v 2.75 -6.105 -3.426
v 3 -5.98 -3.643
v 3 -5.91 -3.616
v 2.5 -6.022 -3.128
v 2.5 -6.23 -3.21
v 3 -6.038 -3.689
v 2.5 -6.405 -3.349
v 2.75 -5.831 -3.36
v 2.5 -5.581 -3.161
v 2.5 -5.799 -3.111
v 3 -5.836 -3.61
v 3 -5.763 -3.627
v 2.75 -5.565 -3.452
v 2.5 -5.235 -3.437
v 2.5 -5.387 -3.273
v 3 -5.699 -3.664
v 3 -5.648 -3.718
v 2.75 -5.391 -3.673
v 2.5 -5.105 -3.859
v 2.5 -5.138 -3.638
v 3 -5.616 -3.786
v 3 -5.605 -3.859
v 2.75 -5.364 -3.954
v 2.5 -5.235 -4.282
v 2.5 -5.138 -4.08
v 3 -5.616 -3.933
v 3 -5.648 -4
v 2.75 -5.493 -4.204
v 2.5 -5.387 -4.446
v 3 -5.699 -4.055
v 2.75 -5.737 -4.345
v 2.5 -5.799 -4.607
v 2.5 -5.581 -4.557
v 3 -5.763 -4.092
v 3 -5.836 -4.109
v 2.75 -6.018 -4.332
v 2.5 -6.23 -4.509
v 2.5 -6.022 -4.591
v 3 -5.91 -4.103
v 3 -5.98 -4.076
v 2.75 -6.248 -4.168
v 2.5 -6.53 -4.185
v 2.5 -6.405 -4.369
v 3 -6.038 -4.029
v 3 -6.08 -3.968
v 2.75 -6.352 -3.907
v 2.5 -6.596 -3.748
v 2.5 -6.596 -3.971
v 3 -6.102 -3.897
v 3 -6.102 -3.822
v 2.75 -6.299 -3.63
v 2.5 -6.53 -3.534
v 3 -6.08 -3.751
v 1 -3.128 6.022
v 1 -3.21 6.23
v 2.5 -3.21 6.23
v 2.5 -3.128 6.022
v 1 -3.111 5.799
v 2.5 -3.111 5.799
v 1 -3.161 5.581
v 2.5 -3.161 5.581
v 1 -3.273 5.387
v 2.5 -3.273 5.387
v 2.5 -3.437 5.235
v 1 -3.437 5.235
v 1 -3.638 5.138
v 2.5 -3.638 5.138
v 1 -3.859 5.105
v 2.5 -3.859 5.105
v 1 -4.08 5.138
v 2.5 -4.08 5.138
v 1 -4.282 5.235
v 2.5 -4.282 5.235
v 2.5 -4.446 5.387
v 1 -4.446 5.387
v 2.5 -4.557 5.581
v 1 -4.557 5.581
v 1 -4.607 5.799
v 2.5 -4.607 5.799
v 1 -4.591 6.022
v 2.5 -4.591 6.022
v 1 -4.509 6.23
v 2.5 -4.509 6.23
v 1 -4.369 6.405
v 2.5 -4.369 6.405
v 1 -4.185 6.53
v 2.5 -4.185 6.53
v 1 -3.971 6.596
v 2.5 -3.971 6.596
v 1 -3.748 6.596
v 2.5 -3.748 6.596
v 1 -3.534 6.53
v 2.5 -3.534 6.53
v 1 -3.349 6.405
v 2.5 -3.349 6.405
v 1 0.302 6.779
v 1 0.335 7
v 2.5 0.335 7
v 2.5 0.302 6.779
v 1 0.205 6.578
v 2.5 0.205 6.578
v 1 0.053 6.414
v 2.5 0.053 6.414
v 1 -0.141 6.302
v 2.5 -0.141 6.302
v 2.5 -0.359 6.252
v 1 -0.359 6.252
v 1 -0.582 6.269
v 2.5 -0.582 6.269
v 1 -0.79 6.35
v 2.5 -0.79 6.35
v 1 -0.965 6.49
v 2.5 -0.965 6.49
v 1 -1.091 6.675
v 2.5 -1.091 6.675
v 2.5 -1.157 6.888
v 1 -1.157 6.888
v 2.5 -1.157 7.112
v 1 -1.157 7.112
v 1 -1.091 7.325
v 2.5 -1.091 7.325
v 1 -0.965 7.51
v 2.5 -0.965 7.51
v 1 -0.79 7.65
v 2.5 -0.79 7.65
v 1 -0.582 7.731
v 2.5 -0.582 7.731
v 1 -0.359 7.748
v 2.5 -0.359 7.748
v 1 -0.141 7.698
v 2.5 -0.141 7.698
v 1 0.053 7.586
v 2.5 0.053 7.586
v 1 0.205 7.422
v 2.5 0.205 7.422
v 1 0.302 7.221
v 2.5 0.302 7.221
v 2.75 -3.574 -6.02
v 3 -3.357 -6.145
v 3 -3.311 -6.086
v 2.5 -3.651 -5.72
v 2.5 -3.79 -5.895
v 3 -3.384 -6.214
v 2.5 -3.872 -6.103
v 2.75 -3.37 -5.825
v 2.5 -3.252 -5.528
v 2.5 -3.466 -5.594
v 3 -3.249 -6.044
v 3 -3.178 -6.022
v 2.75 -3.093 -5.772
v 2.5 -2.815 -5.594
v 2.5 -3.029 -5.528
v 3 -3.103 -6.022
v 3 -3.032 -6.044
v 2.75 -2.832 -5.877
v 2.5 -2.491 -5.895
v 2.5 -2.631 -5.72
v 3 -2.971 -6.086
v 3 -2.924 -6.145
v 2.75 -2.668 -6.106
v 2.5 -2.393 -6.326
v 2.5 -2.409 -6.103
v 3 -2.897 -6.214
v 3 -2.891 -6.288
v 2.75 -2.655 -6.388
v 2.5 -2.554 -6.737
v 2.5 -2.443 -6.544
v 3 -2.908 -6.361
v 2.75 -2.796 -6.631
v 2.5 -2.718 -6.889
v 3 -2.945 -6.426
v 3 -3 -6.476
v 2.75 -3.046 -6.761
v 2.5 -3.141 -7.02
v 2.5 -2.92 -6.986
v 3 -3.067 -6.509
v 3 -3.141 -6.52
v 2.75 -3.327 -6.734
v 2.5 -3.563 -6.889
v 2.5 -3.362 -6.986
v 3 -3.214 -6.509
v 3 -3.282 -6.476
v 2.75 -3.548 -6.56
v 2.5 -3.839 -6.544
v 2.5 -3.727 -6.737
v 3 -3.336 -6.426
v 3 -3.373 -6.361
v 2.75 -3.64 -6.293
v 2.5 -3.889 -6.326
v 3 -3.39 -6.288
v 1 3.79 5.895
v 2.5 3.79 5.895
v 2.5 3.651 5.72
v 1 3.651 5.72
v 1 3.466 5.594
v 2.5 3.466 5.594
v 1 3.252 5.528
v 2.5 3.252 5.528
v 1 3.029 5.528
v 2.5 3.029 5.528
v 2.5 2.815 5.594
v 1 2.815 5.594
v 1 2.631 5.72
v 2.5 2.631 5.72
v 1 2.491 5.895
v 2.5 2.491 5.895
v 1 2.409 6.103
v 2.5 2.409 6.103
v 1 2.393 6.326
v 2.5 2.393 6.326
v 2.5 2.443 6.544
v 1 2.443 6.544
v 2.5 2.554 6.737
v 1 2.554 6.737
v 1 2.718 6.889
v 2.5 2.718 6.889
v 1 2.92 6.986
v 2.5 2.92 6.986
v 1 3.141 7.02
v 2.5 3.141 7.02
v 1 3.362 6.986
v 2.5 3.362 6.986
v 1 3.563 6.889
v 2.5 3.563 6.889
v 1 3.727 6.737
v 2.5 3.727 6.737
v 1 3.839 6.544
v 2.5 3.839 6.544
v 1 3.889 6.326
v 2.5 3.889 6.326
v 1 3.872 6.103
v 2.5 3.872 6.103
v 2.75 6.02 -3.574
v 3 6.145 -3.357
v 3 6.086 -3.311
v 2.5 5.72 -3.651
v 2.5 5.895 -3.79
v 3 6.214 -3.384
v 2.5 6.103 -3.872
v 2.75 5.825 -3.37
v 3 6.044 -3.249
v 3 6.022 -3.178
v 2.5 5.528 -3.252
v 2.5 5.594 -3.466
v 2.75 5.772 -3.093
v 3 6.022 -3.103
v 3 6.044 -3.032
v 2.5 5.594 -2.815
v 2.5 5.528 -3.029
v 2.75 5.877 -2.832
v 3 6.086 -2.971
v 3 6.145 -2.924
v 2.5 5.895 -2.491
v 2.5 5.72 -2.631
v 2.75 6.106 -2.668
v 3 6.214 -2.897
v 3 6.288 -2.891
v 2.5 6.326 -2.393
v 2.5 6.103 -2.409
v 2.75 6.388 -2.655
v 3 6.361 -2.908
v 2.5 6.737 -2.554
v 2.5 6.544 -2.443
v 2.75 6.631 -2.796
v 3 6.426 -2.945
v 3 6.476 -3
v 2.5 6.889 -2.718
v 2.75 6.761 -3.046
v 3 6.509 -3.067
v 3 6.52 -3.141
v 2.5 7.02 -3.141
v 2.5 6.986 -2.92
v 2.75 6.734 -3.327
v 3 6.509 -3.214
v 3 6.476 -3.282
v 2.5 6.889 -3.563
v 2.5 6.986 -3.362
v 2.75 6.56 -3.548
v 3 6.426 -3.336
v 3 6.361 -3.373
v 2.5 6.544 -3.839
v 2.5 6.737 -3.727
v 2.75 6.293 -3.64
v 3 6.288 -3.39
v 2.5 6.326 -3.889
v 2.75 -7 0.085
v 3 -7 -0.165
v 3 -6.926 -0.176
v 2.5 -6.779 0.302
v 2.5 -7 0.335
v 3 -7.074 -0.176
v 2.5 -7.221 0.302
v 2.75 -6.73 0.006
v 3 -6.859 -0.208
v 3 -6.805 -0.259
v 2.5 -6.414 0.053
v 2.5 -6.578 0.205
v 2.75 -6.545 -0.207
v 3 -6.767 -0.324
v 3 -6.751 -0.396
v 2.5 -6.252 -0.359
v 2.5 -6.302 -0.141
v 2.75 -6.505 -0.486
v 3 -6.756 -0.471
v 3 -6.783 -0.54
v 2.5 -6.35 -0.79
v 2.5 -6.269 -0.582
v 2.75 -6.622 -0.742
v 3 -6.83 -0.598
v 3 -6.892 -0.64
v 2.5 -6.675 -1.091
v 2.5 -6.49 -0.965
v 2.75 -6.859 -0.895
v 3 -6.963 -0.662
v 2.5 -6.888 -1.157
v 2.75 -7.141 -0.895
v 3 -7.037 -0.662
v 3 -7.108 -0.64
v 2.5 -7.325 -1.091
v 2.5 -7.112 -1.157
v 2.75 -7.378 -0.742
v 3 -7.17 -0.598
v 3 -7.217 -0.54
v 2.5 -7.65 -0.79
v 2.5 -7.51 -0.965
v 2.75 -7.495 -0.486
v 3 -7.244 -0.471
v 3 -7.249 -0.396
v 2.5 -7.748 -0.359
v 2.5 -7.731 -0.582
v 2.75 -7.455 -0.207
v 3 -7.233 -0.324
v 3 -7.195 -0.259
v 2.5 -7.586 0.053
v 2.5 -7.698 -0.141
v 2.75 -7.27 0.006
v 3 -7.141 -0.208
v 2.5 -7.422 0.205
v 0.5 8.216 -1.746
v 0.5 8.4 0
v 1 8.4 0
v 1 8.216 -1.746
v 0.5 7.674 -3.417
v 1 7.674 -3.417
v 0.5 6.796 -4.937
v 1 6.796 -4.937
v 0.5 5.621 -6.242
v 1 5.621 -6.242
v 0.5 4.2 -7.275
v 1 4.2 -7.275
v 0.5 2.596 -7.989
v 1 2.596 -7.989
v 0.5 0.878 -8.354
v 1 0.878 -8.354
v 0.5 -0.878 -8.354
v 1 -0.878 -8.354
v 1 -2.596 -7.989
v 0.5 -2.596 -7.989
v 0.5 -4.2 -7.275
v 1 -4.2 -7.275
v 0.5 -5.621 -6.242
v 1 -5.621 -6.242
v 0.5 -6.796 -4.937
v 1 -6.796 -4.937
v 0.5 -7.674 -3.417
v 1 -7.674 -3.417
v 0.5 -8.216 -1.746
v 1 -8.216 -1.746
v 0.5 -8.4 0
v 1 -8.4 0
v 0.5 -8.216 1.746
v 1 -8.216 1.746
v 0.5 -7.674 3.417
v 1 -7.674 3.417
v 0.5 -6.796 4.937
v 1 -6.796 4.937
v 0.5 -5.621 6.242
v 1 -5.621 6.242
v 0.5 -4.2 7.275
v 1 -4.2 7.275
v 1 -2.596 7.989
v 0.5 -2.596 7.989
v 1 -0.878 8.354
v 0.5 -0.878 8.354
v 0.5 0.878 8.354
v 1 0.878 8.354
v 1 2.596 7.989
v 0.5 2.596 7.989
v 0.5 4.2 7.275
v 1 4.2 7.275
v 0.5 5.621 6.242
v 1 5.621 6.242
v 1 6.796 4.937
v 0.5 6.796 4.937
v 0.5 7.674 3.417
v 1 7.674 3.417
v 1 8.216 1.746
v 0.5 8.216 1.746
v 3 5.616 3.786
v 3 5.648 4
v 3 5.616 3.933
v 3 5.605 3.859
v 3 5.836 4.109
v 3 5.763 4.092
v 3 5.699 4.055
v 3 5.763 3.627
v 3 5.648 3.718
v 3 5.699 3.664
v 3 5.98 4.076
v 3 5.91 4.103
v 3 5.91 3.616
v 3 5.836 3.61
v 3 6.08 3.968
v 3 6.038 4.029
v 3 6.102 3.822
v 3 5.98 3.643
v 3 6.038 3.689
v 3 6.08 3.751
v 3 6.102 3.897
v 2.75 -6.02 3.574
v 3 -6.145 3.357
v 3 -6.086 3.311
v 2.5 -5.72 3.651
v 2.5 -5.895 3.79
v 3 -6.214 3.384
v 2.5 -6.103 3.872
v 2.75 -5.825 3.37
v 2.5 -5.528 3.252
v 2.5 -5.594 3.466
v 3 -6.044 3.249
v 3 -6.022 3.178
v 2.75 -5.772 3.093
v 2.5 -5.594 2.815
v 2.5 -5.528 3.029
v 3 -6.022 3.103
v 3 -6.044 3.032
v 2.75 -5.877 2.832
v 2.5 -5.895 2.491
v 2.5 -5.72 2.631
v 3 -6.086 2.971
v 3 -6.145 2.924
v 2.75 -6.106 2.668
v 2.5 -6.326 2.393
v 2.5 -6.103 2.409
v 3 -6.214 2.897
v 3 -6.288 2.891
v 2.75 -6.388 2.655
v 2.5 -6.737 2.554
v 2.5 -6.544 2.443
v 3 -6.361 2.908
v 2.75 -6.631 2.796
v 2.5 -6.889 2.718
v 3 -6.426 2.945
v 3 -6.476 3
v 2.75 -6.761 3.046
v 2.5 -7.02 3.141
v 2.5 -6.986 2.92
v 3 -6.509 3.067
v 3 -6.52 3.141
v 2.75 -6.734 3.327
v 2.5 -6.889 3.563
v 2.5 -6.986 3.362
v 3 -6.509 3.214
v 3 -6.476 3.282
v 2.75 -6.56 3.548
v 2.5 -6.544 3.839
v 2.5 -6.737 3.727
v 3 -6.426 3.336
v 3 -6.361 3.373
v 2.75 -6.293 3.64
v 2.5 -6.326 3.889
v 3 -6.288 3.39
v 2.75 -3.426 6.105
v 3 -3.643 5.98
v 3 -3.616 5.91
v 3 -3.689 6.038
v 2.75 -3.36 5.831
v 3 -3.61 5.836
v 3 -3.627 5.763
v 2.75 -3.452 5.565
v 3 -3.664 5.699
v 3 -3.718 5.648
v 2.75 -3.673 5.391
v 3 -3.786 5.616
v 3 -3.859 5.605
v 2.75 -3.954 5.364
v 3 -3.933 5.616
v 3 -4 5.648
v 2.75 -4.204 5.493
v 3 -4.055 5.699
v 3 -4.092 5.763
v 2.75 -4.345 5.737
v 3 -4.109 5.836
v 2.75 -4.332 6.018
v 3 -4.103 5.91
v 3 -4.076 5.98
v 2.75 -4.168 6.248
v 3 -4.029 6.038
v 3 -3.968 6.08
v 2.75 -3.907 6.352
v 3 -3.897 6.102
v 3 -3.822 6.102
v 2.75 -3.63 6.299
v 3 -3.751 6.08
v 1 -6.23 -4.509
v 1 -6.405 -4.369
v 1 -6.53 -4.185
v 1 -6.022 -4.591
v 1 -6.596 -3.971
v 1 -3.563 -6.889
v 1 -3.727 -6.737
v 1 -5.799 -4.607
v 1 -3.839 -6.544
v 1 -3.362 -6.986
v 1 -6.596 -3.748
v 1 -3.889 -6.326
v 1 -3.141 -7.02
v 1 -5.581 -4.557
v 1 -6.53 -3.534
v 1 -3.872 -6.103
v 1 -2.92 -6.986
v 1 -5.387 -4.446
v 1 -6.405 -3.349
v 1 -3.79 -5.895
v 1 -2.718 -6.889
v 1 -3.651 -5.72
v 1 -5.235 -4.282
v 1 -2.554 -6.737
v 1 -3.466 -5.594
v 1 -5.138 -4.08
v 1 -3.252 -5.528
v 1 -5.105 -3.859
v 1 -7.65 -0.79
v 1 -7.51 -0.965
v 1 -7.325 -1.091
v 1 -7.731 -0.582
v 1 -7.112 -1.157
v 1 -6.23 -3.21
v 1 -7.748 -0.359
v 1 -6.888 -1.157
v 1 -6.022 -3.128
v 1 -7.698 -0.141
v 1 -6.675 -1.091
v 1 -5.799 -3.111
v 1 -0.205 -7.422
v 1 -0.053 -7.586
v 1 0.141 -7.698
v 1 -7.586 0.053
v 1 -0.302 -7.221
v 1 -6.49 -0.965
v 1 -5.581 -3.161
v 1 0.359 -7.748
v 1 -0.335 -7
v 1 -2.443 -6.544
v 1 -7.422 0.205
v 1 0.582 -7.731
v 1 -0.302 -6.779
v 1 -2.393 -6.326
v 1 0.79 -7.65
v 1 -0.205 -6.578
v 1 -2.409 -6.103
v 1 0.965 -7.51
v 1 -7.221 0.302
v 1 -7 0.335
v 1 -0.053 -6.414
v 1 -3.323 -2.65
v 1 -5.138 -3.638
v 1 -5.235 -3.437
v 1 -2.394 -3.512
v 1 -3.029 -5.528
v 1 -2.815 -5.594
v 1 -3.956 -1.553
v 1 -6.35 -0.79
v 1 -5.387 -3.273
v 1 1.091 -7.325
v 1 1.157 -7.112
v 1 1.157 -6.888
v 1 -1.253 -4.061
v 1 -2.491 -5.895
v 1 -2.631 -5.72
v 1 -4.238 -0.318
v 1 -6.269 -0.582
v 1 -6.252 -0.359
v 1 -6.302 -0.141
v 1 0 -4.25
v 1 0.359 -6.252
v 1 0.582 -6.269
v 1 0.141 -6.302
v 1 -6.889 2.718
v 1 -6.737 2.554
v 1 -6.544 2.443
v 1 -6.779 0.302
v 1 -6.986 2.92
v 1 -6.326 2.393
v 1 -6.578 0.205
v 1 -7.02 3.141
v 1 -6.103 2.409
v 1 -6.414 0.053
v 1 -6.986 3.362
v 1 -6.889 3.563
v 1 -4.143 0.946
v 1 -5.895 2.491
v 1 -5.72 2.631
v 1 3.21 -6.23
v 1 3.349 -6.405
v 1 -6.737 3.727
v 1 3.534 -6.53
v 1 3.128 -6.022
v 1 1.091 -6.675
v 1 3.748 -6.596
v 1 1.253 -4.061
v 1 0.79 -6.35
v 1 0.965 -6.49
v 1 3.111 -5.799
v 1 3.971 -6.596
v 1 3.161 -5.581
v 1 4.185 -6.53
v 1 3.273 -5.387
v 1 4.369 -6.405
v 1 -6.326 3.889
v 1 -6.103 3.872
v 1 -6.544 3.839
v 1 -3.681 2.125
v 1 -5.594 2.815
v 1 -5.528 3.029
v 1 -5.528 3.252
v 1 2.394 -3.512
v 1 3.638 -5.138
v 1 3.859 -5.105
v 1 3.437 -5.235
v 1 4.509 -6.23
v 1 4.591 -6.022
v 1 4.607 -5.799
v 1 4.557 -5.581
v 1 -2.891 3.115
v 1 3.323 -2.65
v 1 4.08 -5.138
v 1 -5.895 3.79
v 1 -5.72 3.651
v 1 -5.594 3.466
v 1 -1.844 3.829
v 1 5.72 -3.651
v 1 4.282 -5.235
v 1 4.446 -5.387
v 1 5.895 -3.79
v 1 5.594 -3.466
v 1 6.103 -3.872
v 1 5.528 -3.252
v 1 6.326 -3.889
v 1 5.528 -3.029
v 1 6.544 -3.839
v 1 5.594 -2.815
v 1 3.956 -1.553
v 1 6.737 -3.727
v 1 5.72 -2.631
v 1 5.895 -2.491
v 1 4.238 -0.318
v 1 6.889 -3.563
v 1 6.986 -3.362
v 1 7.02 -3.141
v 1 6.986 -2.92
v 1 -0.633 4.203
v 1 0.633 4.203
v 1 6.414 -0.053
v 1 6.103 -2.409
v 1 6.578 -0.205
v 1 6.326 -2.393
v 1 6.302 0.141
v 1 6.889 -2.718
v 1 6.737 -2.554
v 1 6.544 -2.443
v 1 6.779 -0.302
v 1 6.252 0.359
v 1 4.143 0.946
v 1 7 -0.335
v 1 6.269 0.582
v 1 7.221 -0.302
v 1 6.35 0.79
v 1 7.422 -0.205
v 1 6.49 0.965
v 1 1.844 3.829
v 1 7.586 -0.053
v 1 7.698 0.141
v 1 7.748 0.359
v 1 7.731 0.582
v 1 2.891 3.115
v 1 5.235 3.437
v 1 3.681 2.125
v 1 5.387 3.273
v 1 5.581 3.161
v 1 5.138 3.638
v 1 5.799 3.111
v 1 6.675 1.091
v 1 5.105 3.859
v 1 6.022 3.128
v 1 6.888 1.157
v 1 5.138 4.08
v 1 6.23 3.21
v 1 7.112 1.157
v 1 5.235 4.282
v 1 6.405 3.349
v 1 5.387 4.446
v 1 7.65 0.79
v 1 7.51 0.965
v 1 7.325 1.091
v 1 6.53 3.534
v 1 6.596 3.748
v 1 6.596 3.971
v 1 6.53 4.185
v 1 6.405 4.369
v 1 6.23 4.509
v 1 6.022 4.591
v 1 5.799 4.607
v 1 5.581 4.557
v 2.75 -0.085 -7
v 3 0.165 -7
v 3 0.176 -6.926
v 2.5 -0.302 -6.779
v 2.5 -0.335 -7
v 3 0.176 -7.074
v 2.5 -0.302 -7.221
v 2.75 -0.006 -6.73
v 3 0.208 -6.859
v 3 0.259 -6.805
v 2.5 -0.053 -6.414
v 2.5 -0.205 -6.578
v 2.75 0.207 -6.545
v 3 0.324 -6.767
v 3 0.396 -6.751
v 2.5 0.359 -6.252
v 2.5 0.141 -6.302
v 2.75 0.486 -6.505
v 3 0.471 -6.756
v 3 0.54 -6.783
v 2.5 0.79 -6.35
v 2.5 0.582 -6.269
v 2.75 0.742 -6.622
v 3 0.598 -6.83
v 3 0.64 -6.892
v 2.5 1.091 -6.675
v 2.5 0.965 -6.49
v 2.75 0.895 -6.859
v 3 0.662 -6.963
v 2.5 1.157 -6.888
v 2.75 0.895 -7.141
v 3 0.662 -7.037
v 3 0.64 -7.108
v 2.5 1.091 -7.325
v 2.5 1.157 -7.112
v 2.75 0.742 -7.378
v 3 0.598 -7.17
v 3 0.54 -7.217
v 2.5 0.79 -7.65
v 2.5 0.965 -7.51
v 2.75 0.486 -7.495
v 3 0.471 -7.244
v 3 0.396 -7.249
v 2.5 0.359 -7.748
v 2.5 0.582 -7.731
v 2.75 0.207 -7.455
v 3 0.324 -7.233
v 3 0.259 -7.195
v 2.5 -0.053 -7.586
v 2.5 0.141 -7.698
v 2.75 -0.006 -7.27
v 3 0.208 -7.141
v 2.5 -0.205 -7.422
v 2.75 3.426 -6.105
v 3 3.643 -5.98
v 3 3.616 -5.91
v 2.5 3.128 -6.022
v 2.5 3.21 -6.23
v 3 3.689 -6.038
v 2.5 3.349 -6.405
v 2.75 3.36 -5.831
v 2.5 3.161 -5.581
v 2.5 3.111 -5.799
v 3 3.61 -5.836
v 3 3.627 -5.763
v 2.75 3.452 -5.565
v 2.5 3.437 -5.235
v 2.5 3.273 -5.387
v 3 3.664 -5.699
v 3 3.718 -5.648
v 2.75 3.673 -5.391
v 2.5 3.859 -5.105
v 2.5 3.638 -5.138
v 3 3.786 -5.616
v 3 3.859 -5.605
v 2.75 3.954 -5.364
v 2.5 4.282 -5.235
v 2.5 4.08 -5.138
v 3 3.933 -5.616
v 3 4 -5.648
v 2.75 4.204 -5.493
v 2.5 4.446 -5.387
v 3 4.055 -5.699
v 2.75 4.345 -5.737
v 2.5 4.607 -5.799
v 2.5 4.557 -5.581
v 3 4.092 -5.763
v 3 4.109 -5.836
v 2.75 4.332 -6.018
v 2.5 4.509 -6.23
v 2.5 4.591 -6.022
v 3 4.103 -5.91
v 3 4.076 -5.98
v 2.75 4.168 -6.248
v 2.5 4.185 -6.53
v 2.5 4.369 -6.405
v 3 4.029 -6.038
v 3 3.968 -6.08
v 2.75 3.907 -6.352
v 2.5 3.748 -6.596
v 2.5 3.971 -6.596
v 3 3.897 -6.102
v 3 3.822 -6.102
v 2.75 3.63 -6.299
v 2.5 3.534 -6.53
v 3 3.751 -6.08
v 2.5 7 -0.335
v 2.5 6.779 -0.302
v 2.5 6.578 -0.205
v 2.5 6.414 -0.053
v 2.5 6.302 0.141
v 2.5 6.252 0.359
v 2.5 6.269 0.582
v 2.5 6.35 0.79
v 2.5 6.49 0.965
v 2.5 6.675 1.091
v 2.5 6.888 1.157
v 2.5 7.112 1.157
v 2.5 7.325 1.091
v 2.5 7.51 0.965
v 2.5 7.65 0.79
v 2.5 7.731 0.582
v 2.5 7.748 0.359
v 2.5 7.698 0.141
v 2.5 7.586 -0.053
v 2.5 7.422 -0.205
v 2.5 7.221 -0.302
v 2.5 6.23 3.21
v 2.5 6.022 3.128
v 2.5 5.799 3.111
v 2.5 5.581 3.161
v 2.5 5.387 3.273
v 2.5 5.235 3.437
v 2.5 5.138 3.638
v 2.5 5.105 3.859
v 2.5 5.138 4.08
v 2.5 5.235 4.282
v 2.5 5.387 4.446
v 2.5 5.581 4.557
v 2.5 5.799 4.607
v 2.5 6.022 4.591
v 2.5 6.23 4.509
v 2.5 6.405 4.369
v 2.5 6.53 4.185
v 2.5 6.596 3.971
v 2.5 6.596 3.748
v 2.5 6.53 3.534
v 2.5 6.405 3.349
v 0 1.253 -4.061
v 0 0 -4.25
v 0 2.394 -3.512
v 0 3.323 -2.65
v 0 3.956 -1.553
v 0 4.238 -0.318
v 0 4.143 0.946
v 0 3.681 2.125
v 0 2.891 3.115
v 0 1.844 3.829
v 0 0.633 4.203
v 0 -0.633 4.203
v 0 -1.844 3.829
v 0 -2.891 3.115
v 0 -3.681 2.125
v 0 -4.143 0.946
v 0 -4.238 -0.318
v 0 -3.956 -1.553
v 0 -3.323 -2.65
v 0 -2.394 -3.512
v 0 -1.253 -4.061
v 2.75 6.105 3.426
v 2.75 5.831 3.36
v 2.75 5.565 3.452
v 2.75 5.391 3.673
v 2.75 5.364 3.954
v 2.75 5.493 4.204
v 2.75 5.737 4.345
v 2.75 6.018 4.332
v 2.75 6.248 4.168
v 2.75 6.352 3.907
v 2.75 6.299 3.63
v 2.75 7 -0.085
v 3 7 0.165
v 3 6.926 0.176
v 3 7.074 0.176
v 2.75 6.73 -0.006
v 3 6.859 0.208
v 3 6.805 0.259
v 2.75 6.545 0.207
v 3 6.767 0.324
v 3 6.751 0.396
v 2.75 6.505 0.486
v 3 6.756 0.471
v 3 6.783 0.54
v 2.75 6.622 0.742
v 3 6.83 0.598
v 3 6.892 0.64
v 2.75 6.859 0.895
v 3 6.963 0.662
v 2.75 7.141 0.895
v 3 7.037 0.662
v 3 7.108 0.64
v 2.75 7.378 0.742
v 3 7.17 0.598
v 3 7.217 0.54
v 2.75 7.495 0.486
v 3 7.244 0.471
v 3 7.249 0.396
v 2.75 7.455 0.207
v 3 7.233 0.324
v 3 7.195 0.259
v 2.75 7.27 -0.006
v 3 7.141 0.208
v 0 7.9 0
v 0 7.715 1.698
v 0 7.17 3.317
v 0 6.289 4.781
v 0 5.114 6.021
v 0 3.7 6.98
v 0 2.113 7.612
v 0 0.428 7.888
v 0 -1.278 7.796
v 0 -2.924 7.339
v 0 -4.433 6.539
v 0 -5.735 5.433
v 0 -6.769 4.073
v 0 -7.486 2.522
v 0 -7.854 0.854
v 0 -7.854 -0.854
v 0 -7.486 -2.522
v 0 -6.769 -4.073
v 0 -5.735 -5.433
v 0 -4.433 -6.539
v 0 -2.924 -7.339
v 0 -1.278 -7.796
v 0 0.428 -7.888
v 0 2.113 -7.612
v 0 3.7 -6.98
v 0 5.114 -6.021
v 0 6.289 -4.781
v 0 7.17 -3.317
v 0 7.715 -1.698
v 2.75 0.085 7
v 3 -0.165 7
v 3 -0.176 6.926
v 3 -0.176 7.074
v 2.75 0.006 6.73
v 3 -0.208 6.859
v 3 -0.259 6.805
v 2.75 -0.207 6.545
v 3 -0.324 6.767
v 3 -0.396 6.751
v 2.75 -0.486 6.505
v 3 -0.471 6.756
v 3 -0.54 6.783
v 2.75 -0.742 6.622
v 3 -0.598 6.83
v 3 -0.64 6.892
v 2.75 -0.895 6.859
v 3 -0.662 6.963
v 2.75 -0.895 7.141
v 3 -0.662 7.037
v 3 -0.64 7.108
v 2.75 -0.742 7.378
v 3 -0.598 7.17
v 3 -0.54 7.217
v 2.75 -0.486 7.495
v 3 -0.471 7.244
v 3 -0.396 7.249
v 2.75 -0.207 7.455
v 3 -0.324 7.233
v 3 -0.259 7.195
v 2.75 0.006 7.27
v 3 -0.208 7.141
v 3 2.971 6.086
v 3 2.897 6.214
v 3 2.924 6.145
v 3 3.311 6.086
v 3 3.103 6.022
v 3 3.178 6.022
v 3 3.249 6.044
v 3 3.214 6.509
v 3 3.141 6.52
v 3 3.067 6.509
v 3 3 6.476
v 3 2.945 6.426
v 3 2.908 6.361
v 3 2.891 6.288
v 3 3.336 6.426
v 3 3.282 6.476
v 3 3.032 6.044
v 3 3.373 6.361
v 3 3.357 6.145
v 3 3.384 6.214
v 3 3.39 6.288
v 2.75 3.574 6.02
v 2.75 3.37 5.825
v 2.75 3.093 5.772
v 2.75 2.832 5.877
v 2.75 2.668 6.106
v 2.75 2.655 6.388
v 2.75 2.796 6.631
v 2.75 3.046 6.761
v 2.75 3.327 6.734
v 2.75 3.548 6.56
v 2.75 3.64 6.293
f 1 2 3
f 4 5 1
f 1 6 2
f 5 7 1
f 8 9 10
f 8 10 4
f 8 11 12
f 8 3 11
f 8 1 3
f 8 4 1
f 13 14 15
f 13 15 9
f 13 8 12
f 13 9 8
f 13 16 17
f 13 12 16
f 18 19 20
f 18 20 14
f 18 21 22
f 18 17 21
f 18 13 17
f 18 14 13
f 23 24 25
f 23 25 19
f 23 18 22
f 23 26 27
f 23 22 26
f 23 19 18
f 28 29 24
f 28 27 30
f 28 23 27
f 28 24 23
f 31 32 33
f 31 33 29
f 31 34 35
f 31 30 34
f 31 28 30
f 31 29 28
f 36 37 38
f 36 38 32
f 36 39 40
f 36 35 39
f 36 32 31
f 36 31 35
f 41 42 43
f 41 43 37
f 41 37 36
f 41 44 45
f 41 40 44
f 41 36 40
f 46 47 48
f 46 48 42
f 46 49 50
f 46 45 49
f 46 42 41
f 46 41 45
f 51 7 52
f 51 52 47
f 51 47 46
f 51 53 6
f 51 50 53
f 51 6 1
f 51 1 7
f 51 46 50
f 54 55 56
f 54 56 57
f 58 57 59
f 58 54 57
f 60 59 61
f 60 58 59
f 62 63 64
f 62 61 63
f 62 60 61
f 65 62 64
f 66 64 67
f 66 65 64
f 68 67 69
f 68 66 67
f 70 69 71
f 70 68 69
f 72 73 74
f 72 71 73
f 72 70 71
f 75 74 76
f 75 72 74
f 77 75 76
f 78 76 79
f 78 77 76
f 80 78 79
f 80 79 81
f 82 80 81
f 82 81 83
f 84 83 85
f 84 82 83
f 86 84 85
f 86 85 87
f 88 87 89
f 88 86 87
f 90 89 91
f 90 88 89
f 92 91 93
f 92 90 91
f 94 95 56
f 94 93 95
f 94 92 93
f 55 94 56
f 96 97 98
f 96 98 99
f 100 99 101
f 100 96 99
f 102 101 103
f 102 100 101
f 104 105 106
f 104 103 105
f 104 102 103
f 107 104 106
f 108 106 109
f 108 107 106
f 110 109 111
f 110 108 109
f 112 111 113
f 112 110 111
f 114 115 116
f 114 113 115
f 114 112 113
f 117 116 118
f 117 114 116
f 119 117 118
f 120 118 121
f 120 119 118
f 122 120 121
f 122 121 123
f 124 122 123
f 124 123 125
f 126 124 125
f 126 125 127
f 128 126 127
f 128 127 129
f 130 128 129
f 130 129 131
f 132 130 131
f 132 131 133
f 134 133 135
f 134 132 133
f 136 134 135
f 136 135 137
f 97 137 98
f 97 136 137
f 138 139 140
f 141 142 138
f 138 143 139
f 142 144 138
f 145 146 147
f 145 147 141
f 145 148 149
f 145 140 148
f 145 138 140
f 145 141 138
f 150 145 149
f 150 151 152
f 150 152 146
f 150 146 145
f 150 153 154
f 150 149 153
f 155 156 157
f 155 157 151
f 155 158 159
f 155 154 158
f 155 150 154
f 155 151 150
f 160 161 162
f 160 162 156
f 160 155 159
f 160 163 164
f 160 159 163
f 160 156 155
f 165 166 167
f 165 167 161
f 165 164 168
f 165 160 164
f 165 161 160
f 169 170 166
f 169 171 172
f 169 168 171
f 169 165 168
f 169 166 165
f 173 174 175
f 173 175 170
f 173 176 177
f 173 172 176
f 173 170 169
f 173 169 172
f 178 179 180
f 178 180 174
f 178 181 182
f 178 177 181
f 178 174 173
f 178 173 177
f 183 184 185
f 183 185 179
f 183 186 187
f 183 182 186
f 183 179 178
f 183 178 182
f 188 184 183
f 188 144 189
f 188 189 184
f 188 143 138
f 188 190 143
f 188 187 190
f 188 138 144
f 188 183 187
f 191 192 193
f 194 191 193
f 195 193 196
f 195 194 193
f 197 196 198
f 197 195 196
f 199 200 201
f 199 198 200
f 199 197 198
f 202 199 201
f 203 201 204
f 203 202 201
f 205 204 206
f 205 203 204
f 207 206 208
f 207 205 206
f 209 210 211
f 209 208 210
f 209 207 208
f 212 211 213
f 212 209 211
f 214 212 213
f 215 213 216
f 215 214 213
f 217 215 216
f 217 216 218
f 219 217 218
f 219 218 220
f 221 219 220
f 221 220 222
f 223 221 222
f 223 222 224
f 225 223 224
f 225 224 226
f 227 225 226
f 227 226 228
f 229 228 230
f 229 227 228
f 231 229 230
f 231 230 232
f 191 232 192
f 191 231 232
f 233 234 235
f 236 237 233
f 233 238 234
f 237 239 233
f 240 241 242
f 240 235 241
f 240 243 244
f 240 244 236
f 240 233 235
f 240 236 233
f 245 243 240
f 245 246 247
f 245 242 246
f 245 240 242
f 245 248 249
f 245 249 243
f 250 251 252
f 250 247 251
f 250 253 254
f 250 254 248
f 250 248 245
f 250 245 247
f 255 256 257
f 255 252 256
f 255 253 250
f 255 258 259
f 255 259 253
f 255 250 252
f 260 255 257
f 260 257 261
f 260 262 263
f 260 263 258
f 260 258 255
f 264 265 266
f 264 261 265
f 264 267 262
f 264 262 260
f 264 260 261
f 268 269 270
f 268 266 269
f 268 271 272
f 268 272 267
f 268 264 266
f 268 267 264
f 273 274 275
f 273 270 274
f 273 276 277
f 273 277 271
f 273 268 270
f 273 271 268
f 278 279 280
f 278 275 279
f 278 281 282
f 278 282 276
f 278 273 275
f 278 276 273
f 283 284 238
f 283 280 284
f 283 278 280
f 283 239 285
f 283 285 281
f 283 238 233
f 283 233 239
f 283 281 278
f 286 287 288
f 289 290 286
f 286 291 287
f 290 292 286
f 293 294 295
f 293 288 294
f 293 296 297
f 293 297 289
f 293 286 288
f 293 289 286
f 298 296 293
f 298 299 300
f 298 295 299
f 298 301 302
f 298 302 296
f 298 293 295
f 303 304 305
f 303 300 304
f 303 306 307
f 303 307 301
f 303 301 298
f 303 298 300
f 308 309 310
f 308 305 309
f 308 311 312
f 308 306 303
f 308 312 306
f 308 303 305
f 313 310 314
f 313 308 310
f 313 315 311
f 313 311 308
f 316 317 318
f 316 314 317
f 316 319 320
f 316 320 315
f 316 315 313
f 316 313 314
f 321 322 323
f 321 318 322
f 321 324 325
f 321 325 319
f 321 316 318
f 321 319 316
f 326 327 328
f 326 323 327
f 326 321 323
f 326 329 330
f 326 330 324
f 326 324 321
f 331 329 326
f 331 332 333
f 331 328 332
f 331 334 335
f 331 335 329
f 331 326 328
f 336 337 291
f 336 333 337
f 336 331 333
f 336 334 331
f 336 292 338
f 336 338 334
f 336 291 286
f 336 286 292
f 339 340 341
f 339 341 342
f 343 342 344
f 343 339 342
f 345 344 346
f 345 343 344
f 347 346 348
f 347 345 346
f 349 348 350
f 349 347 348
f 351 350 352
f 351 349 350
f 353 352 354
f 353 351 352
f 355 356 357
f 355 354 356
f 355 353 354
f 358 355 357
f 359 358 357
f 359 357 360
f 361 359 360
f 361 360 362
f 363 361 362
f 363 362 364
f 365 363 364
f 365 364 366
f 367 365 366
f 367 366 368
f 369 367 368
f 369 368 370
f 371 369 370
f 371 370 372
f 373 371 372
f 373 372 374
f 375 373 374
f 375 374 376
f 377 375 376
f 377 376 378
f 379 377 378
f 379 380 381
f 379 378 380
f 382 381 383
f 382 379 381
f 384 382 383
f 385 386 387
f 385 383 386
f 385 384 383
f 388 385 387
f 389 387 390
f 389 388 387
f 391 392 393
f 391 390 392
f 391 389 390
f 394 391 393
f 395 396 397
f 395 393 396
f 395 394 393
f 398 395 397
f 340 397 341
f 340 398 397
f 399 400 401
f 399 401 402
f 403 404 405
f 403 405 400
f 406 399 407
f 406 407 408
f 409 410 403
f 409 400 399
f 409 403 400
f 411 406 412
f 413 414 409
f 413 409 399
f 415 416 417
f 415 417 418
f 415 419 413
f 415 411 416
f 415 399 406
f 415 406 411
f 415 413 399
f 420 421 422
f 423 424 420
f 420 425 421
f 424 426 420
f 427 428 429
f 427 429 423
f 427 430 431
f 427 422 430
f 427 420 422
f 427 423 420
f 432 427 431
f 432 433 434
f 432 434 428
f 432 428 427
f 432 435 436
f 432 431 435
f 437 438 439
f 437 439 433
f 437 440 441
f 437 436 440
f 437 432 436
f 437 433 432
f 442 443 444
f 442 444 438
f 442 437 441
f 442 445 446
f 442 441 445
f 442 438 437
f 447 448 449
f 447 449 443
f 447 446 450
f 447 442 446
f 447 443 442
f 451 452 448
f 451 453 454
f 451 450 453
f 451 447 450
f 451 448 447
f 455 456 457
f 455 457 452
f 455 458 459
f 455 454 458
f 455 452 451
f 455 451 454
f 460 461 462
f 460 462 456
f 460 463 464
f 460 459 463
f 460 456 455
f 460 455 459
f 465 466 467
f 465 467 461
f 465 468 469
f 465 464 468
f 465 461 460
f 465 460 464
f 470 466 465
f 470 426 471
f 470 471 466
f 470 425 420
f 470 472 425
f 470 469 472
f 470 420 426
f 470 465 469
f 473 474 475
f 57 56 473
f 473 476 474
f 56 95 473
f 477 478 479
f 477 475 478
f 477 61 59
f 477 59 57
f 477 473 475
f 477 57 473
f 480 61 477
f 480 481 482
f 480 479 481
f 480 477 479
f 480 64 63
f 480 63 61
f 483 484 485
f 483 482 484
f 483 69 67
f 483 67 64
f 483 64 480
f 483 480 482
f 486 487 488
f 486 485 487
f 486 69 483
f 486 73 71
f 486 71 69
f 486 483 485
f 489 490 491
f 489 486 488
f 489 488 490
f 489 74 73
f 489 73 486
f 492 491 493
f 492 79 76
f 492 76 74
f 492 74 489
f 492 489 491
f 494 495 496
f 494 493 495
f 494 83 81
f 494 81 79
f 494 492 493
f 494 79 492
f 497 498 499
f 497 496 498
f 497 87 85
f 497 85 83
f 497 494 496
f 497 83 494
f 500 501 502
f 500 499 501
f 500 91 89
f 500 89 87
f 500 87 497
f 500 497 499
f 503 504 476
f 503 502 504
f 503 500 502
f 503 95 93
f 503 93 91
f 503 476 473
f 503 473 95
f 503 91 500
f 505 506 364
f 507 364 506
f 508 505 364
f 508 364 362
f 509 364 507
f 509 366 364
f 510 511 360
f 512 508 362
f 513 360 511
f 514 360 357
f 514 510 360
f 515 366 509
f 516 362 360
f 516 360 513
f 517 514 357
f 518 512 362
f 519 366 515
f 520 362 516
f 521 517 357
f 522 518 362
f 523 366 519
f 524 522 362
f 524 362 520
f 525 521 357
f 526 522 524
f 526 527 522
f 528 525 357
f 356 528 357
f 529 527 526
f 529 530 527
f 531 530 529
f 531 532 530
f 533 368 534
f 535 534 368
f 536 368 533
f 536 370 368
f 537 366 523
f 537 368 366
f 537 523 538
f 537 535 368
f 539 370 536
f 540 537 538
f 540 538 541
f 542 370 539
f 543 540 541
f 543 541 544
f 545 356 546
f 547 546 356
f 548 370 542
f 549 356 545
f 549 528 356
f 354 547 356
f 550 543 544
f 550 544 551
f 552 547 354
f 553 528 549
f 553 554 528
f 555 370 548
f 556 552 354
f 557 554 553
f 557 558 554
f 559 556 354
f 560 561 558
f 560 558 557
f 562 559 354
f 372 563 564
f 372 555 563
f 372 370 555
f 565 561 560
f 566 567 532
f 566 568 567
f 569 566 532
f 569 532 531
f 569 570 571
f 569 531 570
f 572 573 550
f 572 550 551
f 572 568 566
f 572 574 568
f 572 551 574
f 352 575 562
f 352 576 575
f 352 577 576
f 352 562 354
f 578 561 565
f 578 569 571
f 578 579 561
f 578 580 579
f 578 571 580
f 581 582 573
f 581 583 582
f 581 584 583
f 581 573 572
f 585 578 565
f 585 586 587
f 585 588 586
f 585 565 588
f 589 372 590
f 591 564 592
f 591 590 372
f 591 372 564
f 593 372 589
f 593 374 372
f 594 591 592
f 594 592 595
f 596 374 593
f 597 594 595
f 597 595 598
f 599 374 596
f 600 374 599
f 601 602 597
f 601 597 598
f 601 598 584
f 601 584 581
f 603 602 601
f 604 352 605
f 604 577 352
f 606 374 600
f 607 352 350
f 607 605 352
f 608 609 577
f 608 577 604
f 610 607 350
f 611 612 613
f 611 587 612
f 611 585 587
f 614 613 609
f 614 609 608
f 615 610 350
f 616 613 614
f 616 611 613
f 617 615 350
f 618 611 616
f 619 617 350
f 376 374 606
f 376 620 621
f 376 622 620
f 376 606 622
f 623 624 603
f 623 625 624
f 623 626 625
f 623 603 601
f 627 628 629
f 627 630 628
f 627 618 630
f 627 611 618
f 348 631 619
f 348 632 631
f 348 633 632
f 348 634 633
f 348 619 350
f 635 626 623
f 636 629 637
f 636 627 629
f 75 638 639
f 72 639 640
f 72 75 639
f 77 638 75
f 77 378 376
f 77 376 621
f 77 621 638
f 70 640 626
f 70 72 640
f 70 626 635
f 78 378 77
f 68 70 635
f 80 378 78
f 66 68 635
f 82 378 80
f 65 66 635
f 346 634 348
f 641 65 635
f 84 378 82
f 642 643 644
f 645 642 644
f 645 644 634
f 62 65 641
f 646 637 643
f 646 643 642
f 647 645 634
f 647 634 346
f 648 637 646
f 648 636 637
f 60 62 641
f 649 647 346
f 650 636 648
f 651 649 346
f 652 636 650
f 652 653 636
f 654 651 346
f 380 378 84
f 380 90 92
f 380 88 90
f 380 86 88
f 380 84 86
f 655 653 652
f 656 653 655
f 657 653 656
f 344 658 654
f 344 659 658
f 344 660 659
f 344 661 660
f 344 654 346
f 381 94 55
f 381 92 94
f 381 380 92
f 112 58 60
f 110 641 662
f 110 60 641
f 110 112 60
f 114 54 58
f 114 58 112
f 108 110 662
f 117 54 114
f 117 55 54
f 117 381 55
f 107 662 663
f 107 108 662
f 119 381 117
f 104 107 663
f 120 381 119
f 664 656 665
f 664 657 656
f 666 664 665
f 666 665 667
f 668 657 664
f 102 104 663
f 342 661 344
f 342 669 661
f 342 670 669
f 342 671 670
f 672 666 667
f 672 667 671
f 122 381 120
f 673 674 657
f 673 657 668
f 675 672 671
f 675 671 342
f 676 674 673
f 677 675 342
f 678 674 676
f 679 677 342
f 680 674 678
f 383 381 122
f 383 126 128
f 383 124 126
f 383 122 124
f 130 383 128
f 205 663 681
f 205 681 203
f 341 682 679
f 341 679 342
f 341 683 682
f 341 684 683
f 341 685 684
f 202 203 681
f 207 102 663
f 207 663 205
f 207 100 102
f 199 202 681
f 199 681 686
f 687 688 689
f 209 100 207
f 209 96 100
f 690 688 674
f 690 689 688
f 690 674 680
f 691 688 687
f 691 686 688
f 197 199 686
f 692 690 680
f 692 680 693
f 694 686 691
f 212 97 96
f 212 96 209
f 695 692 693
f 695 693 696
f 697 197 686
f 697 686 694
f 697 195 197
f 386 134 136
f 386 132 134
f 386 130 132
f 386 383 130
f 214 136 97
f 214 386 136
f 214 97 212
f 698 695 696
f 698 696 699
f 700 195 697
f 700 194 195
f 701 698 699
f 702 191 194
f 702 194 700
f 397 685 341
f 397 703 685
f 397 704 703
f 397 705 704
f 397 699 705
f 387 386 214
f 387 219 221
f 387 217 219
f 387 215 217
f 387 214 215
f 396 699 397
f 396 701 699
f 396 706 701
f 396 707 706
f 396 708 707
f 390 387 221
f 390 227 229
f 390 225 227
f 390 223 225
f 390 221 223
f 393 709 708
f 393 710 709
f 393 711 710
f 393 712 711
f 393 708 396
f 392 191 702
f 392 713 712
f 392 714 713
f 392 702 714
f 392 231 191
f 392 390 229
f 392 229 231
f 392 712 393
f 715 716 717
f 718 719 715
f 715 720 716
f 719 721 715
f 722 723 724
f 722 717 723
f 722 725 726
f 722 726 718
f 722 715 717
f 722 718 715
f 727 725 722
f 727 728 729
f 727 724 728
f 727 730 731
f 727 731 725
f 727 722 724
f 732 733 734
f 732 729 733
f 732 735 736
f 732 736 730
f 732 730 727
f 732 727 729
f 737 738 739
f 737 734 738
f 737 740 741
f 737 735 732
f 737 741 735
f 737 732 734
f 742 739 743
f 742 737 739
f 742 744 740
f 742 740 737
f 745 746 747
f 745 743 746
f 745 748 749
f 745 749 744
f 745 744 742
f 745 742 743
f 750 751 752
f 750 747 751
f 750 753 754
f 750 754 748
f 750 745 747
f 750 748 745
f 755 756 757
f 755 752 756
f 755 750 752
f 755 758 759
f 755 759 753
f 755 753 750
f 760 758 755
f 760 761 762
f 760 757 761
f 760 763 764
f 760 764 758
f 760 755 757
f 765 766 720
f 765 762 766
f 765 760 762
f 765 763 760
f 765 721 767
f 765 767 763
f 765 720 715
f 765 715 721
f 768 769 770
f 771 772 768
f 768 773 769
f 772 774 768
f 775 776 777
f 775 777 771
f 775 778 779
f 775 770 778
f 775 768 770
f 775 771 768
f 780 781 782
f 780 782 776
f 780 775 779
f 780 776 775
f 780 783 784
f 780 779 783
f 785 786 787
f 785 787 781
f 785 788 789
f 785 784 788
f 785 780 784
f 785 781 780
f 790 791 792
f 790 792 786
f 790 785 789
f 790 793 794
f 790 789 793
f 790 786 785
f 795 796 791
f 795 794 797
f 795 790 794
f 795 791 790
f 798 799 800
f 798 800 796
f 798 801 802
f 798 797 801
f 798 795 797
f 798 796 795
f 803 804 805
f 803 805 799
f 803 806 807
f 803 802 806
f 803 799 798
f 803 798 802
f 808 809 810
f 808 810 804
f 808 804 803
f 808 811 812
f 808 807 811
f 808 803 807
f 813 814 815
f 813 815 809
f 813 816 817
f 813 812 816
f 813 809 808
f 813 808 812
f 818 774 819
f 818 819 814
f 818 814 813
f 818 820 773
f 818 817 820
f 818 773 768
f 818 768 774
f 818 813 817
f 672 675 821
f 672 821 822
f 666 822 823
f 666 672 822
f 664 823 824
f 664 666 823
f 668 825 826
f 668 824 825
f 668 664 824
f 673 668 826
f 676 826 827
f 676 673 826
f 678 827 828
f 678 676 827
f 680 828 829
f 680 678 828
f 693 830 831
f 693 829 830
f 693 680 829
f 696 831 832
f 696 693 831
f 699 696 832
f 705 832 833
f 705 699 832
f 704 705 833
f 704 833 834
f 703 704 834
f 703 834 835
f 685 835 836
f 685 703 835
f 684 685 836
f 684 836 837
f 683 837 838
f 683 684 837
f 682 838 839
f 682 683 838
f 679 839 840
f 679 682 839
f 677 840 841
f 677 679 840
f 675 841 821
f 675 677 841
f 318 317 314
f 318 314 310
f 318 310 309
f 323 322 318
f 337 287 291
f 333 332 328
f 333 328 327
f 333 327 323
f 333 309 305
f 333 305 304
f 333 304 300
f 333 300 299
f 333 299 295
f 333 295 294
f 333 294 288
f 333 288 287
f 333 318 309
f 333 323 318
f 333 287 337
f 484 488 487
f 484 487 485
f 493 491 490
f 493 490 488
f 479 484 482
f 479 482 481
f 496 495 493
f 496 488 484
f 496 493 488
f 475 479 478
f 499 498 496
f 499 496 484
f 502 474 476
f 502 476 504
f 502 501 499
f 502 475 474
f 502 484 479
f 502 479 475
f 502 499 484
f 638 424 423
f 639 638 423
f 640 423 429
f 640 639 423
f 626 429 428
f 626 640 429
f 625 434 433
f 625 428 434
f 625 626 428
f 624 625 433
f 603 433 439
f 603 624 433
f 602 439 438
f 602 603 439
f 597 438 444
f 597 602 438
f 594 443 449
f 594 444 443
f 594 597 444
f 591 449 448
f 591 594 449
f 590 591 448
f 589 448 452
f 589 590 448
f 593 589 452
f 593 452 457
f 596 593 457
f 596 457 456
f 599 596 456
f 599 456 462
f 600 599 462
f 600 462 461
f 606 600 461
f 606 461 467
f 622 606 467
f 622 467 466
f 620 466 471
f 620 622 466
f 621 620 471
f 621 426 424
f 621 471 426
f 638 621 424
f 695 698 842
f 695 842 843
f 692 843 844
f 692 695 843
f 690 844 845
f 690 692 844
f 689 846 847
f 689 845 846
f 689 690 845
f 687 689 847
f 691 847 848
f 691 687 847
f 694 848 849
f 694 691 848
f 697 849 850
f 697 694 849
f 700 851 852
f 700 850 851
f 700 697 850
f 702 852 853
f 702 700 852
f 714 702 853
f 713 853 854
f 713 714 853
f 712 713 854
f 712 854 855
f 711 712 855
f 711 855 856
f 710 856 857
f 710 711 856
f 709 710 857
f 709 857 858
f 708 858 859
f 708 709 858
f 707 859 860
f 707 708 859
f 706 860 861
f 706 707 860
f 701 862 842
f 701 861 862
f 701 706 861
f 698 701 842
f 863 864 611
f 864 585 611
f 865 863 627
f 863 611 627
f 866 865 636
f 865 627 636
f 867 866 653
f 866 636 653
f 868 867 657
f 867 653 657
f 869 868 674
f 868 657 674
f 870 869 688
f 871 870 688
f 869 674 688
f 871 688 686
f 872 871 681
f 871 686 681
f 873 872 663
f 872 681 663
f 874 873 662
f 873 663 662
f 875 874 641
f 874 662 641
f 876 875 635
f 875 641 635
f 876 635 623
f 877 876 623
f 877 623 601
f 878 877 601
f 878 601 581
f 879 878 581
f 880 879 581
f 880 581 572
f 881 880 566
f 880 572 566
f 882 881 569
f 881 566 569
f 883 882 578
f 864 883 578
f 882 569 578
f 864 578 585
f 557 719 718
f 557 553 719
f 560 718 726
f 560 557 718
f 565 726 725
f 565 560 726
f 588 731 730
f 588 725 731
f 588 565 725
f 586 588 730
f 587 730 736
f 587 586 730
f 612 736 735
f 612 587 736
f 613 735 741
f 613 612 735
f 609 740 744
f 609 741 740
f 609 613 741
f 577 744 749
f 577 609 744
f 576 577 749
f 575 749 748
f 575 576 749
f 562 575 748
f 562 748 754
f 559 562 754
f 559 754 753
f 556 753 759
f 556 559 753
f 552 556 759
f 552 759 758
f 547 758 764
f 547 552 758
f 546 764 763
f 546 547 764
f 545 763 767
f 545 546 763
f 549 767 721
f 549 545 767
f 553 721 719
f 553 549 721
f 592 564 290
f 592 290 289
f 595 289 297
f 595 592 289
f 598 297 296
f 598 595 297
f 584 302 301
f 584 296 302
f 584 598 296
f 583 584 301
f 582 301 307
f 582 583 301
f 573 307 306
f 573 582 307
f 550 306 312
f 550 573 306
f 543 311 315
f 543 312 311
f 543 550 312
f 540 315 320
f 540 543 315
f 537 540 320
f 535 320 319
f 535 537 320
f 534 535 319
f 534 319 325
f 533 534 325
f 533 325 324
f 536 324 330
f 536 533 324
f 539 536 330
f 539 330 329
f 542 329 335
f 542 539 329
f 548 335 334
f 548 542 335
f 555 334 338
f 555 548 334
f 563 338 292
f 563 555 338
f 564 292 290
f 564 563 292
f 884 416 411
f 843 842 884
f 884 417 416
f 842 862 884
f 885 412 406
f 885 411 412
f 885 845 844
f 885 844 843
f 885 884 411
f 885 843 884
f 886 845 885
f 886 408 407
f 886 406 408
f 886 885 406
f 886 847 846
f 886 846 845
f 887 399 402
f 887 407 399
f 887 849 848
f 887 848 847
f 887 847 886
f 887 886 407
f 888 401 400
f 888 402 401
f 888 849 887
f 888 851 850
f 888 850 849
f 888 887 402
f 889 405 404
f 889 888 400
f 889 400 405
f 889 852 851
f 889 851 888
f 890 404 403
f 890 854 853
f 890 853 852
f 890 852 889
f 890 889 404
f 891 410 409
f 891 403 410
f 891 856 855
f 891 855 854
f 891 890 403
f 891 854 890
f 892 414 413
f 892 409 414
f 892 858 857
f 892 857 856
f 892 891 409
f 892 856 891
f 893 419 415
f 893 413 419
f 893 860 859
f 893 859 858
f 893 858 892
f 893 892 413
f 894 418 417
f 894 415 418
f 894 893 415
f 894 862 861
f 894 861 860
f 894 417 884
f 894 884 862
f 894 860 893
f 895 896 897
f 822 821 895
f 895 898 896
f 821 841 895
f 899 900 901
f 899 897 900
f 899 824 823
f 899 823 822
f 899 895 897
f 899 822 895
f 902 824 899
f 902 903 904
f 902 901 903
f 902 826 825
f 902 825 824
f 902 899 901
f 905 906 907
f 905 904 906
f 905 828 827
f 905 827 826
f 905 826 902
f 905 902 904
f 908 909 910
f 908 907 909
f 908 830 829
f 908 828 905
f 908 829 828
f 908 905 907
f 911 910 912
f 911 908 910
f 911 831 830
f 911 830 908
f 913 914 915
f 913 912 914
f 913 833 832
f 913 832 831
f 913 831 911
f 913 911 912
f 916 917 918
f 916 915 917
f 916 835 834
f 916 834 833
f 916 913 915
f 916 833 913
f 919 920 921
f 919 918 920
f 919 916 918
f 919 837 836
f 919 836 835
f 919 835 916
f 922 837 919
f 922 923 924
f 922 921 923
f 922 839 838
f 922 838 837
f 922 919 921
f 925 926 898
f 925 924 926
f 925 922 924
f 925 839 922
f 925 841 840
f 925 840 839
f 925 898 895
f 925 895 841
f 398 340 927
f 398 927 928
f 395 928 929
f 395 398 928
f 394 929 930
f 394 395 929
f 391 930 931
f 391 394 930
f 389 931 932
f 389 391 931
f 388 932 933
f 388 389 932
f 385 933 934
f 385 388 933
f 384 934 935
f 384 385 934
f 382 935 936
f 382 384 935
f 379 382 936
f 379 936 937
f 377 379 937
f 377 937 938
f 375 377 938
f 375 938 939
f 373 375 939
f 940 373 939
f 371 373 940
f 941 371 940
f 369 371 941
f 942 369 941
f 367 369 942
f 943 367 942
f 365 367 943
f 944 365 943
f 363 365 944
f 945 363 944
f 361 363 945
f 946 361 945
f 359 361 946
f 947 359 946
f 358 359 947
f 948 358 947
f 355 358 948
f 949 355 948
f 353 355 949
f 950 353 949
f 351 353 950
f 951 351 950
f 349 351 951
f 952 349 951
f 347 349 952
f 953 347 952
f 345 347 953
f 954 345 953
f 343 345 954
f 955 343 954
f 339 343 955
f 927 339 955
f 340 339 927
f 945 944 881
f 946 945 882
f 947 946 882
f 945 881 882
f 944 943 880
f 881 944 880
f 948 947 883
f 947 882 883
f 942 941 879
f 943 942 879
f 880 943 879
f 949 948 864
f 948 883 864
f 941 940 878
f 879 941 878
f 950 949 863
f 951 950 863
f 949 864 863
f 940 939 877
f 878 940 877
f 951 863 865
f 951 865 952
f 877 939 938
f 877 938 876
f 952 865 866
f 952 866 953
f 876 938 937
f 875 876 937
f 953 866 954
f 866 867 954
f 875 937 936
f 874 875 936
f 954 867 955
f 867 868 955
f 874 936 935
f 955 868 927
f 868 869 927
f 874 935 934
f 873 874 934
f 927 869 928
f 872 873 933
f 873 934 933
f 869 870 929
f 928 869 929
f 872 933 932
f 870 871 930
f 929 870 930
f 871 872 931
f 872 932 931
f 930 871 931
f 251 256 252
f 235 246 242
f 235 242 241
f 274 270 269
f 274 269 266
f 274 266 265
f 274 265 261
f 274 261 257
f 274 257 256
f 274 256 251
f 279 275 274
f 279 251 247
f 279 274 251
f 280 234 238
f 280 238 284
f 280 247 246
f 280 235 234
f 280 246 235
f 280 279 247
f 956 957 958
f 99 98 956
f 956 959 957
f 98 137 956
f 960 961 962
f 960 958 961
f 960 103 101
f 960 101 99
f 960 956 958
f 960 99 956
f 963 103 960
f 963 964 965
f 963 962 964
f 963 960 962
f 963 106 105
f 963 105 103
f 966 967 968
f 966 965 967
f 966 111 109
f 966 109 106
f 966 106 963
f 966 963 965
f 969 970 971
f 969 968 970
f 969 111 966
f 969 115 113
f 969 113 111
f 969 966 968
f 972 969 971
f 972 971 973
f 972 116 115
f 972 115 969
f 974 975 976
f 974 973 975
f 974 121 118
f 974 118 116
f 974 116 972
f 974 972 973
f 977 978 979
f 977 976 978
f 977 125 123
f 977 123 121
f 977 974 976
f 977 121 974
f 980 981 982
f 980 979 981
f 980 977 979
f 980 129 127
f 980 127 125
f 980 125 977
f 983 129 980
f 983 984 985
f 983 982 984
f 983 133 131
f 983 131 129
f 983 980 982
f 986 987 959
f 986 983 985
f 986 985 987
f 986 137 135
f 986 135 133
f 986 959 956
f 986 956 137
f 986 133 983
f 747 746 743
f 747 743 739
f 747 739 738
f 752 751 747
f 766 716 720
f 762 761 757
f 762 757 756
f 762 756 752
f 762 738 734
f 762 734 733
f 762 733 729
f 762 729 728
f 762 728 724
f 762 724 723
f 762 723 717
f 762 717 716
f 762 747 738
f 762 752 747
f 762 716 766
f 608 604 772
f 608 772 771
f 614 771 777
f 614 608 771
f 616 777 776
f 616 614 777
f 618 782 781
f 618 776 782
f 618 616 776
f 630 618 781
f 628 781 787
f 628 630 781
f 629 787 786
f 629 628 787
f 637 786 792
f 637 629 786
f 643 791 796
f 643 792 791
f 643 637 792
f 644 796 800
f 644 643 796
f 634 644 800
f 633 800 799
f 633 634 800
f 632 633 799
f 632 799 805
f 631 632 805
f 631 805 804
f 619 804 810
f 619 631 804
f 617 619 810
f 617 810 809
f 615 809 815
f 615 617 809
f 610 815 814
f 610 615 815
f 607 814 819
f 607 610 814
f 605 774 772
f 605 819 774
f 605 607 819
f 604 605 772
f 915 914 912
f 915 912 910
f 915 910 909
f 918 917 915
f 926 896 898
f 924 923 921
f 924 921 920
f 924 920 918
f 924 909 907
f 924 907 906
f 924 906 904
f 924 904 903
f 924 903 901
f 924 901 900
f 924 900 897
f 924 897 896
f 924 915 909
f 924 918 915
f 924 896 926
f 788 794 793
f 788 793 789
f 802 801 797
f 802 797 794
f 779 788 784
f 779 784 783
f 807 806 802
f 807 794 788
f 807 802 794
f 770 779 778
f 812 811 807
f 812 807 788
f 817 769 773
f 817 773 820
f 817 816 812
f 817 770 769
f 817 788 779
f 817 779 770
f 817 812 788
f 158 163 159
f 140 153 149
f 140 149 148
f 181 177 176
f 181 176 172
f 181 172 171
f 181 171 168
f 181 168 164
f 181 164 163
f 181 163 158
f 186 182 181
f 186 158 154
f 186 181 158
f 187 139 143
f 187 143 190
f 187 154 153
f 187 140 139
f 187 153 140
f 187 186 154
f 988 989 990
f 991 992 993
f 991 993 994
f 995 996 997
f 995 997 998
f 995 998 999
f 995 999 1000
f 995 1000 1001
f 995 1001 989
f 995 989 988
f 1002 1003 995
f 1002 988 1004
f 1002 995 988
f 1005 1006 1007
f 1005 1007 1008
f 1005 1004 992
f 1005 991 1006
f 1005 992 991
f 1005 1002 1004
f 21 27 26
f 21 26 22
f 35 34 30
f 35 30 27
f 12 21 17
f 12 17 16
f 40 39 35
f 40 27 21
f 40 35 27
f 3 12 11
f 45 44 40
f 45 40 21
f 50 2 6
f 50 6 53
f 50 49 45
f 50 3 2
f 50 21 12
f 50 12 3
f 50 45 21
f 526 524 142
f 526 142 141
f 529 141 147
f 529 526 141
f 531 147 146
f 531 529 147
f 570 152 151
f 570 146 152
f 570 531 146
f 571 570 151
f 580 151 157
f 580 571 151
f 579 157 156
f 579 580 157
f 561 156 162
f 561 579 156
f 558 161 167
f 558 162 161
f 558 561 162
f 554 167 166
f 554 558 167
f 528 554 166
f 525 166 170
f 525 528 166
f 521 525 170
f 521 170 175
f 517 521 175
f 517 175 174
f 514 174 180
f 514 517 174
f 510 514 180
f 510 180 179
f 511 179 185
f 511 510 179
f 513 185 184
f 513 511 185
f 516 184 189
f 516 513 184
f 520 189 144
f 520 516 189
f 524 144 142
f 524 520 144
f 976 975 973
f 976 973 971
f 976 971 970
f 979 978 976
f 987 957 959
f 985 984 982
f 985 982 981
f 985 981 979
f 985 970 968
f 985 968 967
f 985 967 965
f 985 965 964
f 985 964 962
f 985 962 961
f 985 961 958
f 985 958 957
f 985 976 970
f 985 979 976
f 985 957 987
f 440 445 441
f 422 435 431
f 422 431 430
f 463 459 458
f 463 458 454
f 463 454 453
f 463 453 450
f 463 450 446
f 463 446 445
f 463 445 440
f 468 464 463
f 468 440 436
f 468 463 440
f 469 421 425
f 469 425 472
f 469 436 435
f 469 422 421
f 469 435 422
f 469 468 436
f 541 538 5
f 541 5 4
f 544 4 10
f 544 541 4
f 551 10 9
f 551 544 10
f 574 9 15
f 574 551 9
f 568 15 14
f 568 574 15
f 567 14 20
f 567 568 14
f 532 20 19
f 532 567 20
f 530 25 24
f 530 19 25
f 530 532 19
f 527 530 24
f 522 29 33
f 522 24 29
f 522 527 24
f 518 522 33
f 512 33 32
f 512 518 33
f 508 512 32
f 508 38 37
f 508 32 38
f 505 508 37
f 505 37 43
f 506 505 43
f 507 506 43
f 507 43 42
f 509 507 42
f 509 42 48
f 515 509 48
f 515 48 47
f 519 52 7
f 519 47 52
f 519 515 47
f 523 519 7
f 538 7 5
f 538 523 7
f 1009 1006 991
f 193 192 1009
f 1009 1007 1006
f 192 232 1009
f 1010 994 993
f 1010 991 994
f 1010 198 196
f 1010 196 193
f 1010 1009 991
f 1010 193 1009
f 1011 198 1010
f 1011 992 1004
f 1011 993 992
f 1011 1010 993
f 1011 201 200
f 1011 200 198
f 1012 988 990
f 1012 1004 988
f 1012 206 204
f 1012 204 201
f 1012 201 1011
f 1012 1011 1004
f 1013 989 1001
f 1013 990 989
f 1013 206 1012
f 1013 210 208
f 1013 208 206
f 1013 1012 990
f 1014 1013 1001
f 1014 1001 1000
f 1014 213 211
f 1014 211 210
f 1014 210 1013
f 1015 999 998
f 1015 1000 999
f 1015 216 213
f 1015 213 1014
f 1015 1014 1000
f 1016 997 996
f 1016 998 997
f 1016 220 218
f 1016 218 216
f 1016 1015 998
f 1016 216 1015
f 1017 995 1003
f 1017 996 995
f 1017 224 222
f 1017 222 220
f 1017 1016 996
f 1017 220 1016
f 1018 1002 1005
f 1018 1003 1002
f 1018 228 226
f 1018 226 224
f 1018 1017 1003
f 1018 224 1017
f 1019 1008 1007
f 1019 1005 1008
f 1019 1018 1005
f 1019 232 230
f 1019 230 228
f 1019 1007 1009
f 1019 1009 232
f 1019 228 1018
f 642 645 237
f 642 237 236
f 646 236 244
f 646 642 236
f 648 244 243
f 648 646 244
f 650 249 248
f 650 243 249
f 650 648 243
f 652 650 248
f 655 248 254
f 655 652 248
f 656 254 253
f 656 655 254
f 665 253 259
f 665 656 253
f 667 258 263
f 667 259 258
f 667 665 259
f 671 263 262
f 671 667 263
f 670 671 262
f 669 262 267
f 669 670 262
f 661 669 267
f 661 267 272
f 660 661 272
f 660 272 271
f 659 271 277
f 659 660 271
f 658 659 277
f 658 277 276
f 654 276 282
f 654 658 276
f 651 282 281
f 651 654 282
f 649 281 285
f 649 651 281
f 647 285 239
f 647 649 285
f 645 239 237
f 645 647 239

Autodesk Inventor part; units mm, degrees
ref_plane "YZ Plane" through (0, 0, 0) normal (1, 0, 0) x (0, 1, 0)
ref_plane "XZ Plane" through (0, 0, 0) normal (0, 1, 0) x (-1, 0, 0)
ref_plane "XY Plane" through (0, 0, 0) normal (0, 0, 1) x (1, 0, 0)
sketch "Skizze1" plane through (0, 0, 0) normal (0, 0, 1) x (1, 0, 0)
  point P0 (0, 0)
sketch "Skizze2" plane through (0, 0, 0) normal (1, 0, 0) x (0, 1, 0)
  circle A0 centre (0, 0) radius 8.4
  dimension "d0" = 16.8
extrude "Extrusion1" add sketch "Skizze2" along normal blind 1
sketch "Skizze3" plane through (1, 0, 0) normal (1, 0, 0) x (0, 0, -1)
  circle A0 centre (0, 0) radius 8.4 projected
  circle A1 centre (-0.4149, 7) radius 0.75
  dimension "d3" = 1.5
  dimension "d4" = 7
extrude "Extrusion2" add sketch "Skizze3" along normal blind 2 contours A1
chamfer "Fase1" distance 0.5 angle 45 1 edges at (3, 7, 1.1649)
pattern_circular "Runde Anordnung1" count 12 over 360 about axis through (0, 0, 0) along (1, 0, 0) of "Extrusion2", "Fase1"
sketch "Skizze4" plane through (1, 0, 0) normal (1, 0, 0) x (0, 0, -1)
  circle A0 centre (0, 0) radius 8.4 projected
  circle A1 centre (0, 0) radius 4.25
  dimension "d16" = 8.5
extrude "Extrusion3" cut sketch "Skizze4" against normal up to next contours A1
chamfer "Fase3" distance 0.5 angle 45 1 edges at (0, -8.4, 0)
properties part number "Servoscheibenflansch"
